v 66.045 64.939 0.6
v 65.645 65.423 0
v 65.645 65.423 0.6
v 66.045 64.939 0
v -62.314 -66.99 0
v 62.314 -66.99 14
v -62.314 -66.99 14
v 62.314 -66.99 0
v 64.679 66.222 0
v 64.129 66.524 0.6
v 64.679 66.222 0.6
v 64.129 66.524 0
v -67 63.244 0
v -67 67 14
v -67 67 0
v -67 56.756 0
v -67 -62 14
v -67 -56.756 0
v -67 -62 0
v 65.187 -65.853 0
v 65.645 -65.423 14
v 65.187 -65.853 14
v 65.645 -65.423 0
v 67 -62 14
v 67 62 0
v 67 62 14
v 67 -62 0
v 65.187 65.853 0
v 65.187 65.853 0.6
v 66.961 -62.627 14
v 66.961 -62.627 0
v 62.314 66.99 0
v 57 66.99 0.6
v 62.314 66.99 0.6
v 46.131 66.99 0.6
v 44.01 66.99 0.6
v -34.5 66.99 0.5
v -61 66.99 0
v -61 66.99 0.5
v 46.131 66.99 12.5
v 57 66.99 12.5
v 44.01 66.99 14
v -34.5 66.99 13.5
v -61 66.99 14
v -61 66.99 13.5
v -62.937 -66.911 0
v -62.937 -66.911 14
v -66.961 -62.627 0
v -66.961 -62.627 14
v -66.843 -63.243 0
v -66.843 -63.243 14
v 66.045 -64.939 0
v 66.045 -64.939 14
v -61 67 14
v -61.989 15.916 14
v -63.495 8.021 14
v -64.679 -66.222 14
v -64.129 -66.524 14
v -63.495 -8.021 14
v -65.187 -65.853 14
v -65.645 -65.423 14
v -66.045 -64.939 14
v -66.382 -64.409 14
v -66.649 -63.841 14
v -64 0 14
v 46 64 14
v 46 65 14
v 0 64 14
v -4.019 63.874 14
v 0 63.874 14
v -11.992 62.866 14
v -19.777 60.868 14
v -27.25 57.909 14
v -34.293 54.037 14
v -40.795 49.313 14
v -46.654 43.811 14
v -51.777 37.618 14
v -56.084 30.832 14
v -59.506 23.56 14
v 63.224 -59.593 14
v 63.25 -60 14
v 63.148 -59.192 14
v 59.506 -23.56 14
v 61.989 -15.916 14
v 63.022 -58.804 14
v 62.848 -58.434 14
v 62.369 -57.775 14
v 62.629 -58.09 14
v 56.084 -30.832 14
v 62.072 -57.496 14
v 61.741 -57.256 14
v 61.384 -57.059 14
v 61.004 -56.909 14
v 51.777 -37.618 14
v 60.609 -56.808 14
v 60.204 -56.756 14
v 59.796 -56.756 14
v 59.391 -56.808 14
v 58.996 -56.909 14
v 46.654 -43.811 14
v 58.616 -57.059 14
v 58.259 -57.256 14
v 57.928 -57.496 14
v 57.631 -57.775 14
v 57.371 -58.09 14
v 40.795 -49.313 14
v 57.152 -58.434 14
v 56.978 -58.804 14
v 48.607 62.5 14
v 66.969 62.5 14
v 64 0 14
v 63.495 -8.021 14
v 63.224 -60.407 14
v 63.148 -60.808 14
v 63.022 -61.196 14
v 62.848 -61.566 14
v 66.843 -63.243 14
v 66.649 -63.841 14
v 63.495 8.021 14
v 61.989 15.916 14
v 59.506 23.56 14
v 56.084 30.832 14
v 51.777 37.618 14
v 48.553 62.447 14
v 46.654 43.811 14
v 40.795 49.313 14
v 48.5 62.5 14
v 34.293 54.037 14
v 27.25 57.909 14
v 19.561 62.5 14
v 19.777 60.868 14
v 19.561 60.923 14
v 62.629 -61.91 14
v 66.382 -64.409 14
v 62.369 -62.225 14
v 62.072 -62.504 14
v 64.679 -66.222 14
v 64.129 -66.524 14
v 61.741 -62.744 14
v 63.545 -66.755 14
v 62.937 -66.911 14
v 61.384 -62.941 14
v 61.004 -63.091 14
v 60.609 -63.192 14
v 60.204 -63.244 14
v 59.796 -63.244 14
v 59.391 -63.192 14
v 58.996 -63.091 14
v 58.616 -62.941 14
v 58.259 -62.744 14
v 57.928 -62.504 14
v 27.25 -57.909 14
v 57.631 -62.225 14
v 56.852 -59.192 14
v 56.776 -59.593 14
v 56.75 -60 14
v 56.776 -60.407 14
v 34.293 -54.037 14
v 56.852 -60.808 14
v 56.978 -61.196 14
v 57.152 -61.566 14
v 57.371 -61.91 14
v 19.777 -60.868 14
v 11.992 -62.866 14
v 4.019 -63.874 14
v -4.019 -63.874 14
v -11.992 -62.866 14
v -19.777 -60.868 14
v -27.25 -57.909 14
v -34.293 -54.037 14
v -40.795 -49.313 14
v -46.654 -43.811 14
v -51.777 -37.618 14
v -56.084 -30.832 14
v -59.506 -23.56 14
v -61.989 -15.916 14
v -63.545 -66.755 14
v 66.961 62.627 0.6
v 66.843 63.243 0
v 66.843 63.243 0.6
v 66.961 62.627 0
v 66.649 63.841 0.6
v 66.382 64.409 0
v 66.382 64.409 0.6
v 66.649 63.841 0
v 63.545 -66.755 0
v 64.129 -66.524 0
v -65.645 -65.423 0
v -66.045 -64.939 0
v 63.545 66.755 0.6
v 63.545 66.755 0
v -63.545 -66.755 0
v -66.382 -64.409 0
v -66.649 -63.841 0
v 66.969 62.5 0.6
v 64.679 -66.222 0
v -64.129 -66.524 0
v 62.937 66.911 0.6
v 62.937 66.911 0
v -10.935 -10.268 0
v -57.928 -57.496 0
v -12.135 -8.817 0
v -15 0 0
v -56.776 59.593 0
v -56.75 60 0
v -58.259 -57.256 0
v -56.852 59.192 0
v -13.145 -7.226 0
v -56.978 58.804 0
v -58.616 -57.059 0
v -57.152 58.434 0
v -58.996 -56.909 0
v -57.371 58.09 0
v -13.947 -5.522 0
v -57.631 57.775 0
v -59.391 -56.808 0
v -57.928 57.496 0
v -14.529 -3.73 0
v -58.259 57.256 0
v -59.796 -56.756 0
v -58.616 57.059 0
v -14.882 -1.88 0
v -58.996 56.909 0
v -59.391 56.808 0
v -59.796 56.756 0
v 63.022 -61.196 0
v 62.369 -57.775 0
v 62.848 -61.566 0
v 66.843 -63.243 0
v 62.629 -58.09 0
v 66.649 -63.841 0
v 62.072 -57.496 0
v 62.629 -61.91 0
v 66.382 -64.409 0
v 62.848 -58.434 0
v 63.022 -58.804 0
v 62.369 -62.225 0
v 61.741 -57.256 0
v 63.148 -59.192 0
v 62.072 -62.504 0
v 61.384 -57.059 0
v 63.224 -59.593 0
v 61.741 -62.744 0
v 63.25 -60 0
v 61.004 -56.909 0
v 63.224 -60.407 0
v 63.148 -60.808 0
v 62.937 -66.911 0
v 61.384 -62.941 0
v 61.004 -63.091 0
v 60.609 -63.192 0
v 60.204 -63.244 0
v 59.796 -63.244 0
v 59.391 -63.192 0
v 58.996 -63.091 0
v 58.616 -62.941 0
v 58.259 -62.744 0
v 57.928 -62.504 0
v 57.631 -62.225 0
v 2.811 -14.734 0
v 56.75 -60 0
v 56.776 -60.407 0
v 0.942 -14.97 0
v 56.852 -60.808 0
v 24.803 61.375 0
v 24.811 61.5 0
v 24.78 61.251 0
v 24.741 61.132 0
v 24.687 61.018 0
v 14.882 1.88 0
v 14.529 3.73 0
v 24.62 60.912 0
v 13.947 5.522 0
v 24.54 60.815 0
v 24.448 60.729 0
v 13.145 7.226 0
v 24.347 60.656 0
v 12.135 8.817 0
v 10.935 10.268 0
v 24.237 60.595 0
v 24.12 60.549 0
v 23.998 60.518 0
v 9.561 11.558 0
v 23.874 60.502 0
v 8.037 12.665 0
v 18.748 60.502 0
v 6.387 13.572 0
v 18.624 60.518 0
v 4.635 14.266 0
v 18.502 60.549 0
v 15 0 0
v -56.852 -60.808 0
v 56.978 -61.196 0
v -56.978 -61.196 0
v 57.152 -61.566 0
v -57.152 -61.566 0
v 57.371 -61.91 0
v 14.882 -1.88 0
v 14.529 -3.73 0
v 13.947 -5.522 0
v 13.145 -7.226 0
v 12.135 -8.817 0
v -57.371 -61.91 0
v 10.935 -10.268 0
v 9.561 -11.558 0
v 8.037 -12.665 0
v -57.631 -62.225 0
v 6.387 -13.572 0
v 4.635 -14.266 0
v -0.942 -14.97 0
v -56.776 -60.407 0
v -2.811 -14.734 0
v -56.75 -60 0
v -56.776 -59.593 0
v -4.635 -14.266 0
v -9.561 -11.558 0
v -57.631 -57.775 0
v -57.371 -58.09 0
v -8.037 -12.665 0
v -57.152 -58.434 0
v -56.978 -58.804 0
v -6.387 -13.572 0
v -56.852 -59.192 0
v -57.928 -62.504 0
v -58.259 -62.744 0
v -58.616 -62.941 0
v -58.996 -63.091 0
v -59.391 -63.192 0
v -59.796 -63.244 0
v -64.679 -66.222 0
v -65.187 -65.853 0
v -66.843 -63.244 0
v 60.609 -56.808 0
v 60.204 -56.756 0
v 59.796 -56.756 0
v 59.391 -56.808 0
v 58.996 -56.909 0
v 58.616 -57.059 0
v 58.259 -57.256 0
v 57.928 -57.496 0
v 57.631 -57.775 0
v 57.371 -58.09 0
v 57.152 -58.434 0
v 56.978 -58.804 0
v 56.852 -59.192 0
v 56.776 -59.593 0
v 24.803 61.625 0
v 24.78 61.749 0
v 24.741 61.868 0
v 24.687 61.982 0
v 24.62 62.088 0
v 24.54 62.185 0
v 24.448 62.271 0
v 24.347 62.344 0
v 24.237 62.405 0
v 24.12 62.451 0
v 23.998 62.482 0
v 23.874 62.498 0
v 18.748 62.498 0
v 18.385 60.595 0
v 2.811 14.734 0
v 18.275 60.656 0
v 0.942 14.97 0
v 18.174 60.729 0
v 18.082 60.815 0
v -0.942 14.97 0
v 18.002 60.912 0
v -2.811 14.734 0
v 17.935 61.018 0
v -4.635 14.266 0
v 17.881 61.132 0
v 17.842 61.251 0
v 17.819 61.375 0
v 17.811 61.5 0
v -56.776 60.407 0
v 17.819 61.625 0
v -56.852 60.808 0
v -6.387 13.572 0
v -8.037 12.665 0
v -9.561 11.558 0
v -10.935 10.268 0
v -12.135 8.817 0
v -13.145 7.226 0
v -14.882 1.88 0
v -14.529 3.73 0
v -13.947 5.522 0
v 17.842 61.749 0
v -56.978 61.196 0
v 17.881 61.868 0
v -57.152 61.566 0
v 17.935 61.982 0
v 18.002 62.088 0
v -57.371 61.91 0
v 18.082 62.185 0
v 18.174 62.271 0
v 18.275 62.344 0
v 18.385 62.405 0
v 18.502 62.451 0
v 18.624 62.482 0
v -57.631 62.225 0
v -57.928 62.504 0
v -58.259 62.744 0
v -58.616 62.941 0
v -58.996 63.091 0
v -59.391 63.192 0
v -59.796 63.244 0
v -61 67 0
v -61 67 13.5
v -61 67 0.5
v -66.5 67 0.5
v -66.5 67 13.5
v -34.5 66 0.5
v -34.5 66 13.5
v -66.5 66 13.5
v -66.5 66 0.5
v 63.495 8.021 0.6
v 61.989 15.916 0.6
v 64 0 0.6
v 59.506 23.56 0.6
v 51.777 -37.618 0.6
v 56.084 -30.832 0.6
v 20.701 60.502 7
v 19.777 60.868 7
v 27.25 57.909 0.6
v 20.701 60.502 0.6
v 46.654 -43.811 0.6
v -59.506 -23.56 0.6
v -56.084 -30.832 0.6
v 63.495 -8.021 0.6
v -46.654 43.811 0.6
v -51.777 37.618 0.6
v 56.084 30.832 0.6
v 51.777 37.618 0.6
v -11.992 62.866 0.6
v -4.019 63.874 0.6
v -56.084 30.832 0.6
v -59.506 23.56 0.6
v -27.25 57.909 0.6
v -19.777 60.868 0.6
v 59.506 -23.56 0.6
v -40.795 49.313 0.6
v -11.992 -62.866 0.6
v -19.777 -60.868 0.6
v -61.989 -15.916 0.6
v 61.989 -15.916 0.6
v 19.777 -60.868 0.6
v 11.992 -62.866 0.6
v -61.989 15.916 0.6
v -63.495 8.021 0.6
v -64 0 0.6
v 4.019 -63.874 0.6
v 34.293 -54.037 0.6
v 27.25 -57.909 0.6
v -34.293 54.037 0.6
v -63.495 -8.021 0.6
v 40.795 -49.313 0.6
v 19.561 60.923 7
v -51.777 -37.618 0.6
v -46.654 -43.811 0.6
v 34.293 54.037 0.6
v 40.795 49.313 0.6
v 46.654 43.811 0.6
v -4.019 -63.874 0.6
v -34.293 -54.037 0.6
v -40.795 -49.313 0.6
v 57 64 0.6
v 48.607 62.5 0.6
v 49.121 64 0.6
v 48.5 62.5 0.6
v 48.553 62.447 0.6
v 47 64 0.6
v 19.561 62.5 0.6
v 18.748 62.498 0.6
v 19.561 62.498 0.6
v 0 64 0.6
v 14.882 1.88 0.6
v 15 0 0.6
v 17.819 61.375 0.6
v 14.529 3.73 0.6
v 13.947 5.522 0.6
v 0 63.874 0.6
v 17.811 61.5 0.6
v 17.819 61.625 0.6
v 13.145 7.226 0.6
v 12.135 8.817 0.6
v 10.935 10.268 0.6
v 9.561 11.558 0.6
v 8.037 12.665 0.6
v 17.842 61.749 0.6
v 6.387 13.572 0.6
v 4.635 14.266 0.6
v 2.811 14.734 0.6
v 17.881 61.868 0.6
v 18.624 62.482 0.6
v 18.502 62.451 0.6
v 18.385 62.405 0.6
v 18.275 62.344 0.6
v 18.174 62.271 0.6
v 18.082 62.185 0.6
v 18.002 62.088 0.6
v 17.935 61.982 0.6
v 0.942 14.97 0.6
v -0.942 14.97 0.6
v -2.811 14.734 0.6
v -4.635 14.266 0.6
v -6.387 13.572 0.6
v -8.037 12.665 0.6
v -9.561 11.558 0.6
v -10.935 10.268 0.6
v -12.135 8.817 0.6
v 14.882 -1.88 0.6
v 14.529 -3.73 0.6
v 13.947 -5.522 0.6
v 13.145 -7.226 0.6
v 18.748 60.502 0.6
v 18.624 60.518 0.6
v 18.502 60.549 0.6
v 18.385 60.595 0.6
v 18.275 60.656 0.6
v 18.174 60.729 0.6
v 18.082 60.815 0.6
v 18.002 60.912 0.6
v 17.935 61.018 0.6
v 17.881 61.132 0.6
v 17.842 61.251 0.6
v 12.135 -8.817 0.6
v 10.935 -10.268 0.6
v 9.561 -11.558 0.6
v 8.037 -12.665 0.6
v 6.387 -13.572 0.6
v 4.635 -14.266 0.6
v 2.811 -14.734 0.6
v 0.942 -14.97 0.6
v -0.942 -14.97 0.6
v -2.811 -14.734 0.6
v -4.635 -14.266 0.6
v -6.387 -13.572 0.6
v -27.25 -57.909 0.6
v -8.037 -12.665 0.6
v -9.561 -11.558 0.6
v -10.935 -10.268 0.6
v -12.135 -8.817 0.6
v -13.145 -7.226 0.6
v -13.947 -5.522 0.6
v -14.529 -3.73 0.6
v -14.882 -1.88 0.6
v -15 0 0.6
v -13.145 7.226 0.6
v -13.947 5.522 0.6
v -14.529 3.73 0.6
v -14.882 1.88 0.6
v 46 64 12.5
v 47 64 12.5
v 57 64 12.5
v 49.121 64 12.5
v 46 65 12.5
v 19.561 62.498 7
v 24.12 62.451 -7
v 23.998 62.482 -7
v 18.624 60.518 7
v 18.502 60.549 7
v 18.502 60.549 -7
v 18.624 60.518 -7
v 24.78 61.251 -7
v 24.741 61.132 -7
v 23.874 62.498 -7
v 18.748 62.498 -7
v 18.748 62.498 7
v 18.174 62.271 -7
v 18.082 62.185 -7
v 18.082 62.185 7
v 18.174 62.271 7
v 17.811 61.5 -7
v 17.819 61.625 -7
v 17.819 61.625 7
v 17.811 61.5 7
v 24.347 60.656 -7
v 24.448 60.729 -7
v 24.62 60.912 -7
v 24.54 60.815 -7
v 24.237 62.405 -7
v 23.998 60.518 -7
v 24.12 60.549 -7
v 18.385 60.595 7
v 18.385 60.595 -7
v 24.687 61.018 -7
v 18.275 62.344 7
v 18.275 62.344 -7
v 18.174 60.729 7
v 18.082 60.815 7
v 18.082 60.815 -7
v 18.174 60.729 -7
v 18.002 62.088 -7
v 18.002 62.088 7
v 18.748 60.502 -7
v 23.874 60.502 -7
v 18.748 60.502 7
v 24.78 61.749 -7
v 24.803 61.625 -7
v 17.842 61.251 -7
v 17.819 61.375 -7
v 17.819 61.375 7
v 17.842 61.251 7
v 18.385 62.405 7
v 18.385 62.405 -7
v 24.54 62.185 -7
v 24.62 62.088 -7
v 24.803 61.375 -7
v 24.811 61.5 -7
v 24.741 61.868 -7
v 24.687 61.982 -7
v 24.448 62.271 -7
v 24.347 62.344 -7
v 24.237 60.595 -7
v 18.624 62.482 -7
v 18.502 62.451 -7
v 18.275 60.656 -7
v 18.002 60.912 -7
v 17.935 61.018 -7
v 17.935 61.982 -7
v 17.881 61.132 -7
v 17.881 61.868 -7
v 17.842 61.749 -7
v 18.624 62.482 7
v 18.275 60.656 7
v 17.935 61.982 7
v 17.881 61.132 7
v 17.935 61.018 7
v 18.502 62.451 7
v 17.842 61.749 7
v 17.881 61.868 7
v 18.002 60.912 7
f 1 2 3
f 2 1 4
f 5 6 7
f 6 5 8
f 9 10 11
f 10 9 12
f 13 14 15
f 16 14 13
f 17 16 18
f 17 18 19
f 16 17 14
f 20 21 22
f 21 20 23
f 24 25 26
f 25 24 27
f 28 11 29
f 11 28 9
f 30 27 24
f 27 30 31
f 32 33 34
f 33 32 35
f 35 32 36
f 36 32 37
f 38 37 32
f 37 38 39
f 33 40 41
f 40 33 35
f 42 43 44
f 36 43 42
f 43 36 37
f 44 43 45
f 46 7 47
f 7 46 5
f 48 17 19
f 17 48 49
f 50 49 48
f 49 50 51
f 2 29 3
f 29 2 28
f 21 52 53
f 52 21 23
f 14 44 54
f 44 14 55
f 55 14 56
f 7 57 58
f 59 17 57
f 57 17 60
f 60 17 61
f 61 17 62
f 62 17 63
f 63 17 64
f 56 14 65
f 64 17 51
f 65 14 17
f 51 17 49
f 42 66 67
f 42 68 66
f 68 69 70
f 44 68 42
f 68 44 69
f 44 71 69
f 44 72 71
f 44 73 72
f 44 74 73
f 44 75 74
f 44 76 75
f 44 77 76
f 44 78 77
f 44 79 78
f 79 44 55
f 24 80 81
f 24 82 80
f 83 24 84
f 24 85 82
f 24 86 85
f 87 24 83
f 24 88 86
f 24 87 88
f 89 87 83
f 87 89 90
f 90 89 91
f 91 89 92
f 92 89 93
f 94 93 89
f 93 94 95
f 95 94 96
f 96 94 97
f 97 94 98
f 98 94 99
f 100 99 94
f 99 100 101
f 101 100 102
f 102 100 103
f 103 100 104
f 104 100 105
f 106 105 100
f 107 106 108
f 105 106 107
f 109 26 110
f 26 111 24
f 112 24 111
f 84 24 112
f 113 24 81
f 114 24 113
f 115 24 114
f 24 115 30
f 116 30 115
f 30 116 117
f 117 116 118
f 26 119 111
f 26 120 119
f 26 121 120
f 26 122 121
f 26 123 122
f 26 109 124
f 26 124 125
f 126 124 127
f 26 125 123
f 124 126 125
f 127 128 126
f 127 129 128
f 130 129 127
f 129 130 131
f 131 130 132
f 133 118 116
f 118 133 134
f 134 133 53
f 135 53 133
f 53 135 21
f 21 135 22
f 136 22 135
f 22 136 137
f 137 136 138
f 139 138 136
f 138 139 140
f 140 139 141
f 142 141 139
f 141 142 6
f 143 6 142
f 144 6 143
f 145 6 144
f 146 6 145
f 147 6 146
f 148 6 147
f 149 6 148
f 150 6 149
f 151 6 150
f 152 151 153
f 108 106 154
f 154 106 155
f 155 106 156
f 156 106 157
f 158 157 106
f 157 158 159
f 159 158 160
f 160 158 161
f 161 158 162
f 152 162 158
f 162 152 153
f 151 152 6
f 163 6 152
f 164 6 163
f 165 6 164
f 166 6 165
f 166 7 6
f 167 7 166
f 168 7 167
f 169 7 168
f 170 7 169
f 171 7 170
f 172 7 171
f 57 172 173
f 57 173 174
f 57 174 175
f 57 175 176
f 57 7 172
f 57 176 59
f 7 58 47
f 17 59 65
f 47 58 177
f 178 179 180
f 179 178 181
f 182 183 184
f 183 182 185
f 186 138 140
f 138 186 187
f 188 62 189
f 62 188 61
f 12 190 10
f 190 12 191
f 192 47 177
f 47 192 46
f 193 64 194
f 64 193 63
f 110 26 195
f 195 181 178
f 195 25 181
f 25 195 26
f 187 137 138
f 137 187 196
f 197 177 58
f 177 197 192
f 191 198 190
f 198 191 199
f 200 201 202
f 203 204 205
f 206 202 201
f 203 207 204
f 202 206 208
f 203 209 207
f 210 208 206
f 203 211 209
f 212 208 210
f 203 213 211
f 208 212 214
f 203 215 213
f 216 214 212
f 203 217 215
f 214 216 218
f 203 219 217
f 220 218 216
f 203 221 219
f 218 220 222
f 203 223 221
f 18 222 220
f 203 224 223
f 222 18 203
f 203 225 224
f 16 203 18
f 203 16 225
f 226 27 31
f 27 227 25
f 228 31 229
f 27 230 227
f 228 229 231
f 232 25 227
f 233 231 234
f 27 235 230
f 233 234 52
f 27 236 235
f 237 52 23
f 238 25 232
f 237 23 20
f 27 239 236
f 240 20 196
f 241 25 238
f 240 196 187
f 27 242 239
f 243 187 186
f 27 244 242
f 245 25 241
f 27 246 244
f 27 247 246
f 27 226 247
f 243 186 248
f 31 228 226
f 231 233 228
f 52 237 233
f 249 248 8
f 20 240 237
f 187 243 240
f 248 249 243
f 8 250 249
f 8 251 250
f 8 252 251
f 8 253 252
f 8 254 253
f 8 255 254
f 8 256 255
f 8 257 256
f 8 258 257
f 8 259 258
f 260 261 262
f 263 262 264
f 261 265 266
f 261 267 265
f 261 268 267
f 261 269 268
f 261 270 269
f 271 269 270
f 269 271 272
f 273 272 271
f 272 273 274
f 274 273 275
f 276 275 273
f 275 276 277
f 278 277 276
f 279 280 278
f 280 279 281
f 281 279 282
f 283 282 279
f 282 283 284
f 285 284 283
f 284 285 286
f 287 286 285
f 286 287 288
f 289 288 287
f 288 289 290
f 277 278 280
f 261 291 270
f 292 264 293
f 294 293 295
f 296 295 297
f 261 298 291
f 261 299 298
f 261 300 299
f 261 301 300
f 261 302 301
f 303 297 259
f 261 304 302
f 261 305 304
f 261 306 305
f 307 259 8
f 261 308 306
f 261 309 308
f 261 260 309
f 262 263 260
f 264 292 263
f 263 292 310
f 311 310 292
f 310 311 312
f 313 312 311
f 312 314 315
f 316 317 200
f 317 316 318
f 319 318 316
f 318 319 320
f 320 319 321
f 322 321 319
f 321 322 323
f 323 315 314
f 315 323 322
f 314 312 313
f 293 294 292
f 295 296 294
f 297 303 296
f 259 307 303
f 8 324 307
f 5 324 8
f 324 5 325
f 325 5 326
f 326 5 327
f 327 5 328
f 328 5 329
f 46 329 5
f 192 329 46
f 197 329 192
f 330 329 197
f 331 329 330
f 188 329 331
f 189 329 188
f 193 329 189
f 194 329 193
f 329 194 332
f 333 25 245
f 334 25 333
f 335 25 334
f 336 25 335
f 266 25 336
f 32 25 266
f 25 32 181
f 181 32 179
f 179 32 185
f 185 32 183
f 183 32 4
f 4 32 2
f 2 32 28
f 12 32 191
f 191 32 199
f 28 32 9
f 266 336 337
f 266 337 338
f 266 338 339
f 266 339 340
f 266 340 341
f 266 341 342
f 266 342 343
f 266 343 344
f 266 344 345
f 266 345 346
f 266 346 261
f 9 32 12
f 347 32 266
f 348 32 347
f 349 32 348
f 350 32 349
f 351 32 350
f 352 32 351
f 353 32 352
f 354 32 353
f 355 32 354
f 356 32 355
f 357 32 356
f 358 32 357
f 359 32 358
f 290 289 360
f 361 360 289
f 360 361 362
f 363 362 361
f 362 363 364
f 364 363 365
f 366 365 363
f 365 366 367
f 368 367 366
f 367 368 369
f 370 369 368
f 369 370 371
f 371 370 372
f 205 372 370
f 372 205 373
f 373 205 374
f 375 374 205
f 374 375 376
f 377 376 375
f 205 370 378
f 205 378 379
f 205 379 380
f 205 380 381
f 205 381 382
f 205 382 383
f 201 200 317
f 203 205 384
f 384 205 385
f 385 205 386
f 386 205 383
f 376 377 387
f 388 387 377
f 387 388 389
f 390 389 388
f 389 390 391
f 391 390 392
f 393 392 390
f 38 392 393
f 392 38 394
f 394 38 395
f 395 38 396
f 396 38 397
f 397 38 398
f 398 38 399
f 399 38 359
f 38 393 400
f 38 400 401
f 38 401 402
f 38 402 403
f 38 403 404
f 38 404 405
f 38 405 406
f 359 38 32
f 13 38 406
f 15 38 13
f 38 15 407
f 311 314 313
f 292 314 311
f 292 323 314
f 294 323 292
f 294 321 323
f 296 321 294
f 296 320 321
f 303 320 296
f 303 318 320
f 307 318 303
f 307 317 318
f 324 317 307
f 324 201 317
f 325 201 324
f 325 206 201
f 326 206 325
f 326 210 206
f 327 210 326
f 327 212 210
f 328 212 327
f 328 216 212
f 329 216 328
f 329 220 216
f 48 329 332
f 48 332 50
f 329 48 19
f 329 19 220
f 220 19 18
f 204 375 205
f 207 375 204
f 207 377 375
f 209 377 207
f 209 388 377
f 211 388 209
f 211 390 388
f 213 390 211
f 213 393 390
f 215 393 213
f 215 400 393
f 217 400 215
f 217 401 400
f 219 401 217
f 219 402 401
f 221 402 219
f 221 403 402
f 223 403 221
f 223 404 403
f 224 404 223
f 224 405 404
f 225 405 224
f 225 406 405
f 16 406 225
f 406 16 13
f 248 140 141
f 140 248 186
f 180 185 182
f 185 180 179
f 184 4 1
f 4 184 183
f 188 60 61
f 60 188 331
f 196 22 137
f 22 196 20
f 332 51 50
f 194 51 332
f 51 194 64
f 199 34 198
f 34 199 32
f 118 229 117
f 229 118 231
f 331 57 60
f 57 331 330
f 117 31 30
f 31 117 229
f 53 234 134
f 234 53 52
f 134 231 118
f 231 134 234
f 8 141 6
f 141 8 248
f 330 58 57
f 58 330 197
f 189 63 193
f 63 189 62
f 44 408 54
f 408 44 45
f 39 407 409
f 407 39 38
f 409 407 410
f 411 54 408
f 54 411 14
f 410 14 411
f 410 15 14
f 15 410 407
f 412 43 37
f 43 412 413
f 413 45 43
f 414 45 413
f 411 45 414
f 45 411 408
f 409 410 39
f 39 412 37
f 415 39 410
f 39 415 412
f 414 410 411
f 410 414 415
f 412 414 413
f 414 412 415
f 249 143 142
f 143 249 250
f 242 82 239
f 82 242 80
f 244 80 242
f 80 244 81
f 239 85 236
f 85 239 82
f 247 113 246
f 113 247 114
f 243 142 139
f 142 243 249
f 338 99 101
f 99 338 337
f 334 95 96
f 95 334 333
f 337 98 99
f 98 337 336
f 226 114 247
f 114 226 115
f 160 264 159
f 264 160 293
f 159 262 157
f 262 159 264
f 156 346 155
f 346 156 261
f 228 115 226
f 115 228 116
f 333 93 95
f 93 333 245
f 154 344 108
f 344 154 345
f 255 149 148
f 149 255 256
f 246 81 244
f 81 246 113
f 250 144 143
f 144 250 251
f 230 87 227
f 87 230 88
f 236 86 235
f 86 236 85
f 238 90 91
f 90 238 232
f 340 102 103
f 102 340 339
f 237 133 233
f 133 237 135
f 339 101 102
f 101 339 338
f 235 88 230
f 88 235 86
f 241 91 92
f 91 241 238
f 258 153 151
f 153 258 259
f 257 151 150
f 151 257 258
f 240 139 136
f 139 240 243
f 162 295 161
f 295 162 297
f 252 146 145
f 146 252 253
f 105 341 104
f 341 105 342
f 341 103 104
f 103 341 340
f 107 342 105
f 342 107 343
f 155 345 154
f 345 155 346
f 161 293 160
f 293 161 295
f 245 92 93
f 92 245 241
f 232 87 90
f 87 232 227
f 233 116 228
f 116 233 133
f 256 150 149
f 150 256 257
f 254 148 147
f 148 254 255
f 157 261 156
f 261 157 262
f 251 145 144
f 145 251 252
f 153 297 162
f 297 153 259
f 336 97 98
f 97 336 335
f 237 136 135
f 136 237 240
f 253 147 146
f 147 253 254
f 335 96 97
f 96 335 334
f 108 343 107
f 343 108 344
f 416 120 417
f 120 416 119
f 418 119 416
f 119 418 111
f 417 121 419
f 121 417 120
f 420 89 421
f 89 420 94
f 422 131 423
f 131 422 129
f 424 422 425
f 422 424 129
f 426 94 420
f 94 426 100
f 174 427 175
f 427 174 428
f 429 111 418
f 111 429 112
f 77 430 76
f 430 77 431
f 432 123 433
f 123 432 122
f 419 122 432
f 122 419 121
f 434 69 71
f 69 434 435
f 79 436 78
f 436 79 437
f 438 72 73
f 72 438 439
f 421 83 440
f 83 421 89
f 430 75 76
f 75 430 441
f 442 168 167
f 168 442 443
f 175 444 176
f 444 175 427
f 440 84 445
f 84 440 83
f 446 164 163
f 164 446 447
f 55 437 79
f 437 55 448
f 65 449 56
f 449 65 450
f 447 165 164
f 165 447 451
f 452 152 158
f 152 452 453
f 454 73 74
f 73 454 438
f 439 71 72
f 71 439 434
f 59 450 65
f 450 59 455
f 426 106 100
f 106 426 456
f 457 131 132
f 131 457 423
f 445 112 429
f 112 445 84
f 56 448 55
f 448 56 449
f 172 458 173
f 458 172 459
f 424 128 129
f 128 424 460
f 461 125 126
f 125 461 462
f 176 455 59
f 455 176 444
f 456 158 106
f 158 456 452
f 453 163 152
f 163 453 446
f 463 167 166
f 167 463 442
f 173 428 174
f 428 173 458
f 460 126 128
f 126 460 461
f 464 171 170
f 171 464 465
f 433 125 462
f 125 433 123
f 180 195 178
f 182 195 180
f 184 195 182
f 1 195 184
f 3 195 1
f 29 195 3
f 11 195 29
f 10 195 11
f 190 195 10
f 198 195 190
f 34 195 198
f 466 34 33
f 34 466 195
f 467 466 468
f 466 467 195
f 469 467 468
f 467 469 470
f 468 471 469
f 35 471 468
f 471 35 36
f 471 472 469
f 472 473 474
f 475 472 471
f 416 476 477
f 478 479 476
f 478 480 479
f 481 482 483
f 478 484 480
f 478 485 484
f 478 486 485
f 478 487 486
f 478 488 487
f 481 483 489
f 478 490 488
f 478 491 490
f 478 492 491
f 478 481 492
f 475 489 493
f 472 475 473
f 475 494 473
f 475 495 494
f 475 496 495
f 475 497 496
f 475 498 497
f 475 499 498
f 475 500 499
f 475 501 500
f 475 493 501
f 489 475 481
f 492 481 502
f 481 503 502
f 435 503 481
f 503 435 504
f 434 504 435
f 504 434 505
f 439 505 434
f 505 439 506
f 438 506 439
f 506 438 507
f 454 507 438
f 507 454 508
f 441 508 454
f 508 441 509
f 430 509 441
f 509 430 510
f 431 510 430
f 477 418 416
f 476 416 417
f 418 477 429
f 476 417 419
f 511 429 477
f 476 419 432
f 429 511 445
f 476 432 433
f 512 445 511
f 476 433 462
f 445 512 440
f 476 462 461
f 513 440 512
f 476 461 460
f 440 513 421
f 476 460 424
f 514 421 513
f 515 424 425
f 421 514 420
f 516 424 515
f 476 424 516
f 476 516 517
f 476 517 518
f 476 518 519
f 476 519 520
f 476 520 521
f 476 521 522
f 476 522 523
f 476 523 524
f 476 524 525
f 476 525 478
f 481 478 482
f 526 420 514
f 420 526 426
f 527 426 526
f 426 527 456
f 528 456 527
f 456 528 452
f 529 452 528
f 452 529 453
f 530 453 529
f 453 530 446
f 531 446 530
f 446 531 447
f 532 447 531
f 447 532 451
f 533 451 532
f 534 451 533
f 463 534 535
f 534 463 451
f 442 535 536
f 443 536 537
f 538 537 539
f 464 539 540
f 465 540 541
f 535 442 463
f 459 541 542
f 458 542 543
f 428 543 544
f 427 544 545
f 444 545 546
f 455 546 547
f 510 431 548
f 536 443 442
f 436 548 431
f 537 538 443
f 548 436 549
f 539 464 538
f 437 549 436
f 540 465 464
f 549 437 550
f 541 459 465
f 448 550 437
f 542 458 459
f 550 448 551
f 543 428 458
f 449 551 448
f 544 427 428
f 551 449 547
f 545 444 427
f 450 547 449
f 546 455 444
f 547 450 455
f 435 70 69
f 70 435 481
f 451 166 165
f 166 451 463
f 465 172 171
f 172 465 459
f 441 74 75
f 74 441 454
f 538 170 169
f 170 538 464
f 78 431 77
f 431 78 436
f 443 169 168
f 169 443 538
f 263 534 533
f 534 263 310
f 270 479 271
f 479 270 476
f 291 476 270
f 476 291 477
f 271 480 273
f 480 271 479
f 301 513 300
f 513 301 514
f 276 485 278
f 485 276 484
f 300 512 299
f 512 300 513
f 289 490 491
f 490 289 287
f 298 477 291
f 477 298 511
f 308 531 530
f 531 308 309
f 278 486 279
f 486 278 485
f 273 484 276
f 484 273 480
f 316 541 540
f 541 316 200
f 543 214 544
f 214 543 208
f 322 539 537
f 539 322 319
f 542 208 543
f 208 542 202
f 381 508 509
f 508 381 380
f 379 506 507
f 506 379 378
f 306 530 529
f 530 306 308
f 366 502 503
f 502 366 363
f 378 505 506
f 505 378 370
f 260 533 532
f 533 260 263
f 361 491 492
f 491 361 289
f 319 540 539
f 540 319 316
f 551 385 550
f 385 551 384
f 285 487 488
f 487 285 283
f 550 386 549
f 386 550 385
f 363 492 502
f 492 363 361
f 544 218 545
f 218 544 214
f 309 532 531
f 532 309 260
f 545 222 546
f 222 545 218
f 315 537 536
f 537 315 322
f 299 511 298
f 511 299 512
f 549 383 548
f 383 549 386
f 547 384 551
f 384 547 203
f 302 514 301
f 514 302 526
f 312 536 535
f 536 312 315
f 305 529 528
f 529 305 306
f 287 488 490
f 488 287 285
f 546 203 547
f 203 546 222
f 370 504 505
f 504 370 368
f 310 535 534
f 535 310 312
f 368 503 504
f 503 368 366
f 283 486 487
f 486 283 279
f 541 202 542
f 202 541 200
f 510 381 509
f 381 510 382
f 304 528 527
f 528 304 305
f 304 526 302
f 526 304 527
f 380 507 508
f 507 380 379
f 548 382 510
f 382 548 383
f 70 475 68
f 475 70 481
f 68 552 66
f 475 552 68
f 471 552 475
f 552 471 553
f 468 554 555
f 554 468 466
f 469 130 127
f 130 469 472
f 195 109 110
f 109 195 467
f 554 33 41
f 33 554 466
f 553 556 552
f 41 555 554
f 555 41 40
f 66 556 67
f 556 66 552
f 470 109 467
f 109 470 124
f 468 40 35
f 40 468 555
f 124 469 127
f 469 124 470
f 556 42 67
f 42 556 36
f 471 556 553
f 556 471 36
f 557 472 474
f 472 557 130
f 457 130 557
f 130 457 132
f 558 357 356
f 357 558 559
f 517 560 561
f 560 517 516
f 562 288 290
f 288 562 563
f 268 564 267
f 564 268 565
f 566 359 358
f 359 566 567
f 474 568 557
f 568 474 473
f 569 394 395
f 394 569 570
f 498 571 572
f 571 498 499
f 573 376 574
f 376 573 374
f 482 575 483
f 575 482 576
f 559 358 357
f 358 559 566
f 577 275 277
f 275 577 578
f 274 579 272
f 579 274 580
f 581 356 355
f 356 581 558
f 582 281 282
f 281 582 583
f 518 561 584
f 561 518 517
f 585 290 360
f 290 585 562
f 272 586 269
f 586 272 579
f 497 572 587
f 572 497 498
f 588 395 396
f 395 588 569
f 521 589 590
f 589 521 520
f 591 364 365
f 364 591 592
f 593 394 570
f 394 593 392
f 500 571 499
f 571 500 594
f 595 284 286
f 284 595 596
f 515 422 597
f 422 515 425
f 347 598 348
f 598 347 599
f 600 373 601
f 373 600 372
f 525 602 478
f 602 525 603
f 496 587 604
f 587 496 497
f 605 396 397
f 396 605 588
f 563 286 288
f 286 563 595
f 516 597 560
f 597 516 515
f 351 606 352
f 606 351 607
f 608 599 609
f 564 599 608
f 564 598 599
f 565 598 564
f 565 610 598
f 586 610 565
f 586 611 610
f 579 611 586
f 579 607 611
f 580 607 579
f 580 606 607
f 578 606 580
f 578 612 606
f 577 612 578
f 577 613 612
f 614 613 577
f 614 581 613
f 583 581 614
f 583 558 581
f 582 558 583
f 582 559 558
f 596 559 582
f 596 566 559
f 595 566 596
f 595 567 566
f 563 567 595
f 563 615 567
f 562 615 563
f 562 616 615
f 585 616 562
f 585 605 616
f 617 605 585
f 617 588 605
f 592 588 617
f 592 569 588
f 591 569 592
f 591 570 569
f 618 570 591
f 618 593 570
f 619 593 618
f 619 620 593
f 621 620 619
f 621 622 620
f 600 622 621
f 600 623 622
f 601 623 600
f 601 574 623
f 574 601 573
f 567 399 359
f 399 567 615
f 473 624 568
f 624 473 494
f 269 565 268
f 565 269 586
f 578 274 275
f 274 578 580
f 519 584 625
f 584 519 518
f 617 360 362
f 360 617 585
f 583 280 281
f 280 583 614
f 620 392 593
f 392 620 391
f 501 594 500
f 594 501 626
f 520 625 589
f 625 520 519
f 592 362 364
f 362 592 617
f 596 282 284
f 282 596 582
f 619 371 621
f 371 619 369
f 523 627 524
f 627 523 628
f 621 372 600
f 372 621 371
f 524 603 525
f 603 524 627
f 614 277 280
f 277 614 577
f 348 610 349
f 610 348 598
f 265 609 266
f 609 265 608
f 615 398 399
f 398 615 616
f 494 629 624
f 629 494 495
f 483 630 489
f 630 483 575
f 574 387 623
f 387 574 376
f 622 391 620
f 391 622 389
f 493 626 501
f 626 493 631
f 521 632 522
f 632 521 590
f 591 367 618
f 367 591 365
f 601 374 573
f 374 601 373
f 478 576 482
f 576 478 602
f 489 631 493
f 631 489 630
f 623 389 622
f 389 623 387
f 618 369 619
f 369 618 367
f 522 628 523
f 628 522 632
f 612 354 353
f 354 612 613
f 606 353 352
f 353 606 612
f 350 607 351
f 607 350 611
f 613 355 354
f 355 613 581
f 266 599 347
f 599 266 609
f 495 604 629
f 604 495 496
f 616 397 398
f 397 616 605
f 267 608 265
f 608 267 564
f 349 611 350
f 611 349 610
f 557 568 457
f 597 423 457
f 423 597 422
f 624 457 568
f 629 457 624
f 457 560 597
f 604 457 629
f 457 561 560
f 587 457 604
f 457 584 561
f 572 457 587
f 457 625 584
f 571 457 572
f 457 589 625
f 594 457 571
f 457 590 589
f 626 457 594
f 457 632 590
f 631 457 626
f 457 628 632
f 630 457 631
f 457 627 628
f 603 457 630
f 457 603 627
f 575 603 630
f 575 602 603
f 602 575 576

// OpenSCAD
$fn = 50;


union() {
	difference() {
		union() {
			hull() {
				translate(v = [-62.0000000000, 62.0000000000, 0]) {
					cylinder(h = 14, r = 5);
				}
				translate(v = [62.0000000000, 62.0000000000, 0]) {
					cylinder(h = 14, r = 5);
				}
				translate(v = [-62.0000000000, -62.0000000000, 0]) {
					cylinder(h = 14, r = 5);
				}
				translate(v = [62.0000000000, -62.0000000000, 0]) {
					cylinder(h = 14, r = 5);
				}
			}
			translate(v = [-67.0000000000, 61.0000000000, 0]) {
				cube(size = [6, 6, 14]);
			}
		}
		union() {
			translate(v = [-67.5000000000, -60.0000000000, -250.0000000000]) {
				rotate(a = [0, 0, 0]) {
					difference() {
						union() {
							hull() {
								translate(v = [7.5000000000, 0, 0]) {
									cylinder(h = 250, r = 3.2500000000, r1 = 3.2500000000, r2 = 3.2500000000);
								}
								translate(v = [-7.5000000000, 0, 0]) {
									cylinder(h = 250, r = 3.2500000000, r1 = 3.2500000000, r2 = 3.2500000000);
								}
							}
						}
						union();
					}
				}
			}
			translate(v = [-67.5000000000, 60.0000000000, -250.0000000000]) {
				rotate(a = [0, 0, 0]) {
					difference() {
						union() {
							hull() {
								translate(v = [7.5000000000, 0, 0]) {
									cylinder(h = 250, r = 3.2500000000, r1 = 3.2500000000, r2 = 3.2500000000);
								}
								translate(v = [-7.5000000000, 0, 0]) {
									cylinder(h = 250, r = 3.2500000000, r1 = 3.2500000000, r2 = 3.2500000000);
								}
							}
						}
						union();
					}
				}
			}
			translate(v = [-66.5000000000, 66.0000000000, 0.5000000000]) {
				cube(size = [32, 1, 13.0000000000]);
			}
			translate(v = [60.0000000000, -60.0000000000, 0]) {
				cylinder(h = 100, r = 3.2500000000);
			}
			translate(v = [0, 0, 0.6000000000]) {
				cylinder(h = 16.4000000000, r = 64.0000000000);
			}
			translate(v = [0, 0, -7.0000000000]) {
				cylinder(h = 14, r = 15.0000000000);
			}
			translate(v = [0.0000000000, 62.5000000000, 0.6000000000]) {
				cube(size = [67.0000000000, 1.5000000000, 16.4000000000]);
			}
			translate(v = [57.0000000000, 62.5000000000, 0.6000000000]) {
				cube(size = [10, 4.5000000000, 16.4000000000]);
			}
			translate(v = [46.0000000000, 62.5000000000, 12.5000000000]) {
				cube(size = [21, 4.5000000000, 1.5000000000]);
			}
			translate(v = [43.2500000000, 67.7500000000, 0.6000000000]) {
				rotate(a = [0, 0, -45]) {
					cube(size = [7.5000000000, 1.5000000000, 16.4000000000]);
				}
			}
			translate(v = [12.0610000000, 60.5000000000, 0.6000000000]) {
				cube(size = [7.5000000000, 2, 13.4000000000]);
			}
		}
	}
	union() {
		translate(v = [21.3110000000, 61.5000000000, -7.0000000000]) {
			rotate(a = [0, 0, 0]) {
				difference() {
					union() {
						#hull() {
							#translate(v = [2.5000000000, 0, 0]) {
								cylinder(h = 14, r = 1.0000000000, r1 = 1.0000000000, r2 = 1.0000000000);
							}
							#translate(v = [-2.5000000000, 0, 0]) {
								cylinder(h = 14, r = 1.0000000000, r1 = 1.0000000000, r2 = 1.0000000000);
							}
						}
					}
					union();
				}
			}
		}
	}
}
